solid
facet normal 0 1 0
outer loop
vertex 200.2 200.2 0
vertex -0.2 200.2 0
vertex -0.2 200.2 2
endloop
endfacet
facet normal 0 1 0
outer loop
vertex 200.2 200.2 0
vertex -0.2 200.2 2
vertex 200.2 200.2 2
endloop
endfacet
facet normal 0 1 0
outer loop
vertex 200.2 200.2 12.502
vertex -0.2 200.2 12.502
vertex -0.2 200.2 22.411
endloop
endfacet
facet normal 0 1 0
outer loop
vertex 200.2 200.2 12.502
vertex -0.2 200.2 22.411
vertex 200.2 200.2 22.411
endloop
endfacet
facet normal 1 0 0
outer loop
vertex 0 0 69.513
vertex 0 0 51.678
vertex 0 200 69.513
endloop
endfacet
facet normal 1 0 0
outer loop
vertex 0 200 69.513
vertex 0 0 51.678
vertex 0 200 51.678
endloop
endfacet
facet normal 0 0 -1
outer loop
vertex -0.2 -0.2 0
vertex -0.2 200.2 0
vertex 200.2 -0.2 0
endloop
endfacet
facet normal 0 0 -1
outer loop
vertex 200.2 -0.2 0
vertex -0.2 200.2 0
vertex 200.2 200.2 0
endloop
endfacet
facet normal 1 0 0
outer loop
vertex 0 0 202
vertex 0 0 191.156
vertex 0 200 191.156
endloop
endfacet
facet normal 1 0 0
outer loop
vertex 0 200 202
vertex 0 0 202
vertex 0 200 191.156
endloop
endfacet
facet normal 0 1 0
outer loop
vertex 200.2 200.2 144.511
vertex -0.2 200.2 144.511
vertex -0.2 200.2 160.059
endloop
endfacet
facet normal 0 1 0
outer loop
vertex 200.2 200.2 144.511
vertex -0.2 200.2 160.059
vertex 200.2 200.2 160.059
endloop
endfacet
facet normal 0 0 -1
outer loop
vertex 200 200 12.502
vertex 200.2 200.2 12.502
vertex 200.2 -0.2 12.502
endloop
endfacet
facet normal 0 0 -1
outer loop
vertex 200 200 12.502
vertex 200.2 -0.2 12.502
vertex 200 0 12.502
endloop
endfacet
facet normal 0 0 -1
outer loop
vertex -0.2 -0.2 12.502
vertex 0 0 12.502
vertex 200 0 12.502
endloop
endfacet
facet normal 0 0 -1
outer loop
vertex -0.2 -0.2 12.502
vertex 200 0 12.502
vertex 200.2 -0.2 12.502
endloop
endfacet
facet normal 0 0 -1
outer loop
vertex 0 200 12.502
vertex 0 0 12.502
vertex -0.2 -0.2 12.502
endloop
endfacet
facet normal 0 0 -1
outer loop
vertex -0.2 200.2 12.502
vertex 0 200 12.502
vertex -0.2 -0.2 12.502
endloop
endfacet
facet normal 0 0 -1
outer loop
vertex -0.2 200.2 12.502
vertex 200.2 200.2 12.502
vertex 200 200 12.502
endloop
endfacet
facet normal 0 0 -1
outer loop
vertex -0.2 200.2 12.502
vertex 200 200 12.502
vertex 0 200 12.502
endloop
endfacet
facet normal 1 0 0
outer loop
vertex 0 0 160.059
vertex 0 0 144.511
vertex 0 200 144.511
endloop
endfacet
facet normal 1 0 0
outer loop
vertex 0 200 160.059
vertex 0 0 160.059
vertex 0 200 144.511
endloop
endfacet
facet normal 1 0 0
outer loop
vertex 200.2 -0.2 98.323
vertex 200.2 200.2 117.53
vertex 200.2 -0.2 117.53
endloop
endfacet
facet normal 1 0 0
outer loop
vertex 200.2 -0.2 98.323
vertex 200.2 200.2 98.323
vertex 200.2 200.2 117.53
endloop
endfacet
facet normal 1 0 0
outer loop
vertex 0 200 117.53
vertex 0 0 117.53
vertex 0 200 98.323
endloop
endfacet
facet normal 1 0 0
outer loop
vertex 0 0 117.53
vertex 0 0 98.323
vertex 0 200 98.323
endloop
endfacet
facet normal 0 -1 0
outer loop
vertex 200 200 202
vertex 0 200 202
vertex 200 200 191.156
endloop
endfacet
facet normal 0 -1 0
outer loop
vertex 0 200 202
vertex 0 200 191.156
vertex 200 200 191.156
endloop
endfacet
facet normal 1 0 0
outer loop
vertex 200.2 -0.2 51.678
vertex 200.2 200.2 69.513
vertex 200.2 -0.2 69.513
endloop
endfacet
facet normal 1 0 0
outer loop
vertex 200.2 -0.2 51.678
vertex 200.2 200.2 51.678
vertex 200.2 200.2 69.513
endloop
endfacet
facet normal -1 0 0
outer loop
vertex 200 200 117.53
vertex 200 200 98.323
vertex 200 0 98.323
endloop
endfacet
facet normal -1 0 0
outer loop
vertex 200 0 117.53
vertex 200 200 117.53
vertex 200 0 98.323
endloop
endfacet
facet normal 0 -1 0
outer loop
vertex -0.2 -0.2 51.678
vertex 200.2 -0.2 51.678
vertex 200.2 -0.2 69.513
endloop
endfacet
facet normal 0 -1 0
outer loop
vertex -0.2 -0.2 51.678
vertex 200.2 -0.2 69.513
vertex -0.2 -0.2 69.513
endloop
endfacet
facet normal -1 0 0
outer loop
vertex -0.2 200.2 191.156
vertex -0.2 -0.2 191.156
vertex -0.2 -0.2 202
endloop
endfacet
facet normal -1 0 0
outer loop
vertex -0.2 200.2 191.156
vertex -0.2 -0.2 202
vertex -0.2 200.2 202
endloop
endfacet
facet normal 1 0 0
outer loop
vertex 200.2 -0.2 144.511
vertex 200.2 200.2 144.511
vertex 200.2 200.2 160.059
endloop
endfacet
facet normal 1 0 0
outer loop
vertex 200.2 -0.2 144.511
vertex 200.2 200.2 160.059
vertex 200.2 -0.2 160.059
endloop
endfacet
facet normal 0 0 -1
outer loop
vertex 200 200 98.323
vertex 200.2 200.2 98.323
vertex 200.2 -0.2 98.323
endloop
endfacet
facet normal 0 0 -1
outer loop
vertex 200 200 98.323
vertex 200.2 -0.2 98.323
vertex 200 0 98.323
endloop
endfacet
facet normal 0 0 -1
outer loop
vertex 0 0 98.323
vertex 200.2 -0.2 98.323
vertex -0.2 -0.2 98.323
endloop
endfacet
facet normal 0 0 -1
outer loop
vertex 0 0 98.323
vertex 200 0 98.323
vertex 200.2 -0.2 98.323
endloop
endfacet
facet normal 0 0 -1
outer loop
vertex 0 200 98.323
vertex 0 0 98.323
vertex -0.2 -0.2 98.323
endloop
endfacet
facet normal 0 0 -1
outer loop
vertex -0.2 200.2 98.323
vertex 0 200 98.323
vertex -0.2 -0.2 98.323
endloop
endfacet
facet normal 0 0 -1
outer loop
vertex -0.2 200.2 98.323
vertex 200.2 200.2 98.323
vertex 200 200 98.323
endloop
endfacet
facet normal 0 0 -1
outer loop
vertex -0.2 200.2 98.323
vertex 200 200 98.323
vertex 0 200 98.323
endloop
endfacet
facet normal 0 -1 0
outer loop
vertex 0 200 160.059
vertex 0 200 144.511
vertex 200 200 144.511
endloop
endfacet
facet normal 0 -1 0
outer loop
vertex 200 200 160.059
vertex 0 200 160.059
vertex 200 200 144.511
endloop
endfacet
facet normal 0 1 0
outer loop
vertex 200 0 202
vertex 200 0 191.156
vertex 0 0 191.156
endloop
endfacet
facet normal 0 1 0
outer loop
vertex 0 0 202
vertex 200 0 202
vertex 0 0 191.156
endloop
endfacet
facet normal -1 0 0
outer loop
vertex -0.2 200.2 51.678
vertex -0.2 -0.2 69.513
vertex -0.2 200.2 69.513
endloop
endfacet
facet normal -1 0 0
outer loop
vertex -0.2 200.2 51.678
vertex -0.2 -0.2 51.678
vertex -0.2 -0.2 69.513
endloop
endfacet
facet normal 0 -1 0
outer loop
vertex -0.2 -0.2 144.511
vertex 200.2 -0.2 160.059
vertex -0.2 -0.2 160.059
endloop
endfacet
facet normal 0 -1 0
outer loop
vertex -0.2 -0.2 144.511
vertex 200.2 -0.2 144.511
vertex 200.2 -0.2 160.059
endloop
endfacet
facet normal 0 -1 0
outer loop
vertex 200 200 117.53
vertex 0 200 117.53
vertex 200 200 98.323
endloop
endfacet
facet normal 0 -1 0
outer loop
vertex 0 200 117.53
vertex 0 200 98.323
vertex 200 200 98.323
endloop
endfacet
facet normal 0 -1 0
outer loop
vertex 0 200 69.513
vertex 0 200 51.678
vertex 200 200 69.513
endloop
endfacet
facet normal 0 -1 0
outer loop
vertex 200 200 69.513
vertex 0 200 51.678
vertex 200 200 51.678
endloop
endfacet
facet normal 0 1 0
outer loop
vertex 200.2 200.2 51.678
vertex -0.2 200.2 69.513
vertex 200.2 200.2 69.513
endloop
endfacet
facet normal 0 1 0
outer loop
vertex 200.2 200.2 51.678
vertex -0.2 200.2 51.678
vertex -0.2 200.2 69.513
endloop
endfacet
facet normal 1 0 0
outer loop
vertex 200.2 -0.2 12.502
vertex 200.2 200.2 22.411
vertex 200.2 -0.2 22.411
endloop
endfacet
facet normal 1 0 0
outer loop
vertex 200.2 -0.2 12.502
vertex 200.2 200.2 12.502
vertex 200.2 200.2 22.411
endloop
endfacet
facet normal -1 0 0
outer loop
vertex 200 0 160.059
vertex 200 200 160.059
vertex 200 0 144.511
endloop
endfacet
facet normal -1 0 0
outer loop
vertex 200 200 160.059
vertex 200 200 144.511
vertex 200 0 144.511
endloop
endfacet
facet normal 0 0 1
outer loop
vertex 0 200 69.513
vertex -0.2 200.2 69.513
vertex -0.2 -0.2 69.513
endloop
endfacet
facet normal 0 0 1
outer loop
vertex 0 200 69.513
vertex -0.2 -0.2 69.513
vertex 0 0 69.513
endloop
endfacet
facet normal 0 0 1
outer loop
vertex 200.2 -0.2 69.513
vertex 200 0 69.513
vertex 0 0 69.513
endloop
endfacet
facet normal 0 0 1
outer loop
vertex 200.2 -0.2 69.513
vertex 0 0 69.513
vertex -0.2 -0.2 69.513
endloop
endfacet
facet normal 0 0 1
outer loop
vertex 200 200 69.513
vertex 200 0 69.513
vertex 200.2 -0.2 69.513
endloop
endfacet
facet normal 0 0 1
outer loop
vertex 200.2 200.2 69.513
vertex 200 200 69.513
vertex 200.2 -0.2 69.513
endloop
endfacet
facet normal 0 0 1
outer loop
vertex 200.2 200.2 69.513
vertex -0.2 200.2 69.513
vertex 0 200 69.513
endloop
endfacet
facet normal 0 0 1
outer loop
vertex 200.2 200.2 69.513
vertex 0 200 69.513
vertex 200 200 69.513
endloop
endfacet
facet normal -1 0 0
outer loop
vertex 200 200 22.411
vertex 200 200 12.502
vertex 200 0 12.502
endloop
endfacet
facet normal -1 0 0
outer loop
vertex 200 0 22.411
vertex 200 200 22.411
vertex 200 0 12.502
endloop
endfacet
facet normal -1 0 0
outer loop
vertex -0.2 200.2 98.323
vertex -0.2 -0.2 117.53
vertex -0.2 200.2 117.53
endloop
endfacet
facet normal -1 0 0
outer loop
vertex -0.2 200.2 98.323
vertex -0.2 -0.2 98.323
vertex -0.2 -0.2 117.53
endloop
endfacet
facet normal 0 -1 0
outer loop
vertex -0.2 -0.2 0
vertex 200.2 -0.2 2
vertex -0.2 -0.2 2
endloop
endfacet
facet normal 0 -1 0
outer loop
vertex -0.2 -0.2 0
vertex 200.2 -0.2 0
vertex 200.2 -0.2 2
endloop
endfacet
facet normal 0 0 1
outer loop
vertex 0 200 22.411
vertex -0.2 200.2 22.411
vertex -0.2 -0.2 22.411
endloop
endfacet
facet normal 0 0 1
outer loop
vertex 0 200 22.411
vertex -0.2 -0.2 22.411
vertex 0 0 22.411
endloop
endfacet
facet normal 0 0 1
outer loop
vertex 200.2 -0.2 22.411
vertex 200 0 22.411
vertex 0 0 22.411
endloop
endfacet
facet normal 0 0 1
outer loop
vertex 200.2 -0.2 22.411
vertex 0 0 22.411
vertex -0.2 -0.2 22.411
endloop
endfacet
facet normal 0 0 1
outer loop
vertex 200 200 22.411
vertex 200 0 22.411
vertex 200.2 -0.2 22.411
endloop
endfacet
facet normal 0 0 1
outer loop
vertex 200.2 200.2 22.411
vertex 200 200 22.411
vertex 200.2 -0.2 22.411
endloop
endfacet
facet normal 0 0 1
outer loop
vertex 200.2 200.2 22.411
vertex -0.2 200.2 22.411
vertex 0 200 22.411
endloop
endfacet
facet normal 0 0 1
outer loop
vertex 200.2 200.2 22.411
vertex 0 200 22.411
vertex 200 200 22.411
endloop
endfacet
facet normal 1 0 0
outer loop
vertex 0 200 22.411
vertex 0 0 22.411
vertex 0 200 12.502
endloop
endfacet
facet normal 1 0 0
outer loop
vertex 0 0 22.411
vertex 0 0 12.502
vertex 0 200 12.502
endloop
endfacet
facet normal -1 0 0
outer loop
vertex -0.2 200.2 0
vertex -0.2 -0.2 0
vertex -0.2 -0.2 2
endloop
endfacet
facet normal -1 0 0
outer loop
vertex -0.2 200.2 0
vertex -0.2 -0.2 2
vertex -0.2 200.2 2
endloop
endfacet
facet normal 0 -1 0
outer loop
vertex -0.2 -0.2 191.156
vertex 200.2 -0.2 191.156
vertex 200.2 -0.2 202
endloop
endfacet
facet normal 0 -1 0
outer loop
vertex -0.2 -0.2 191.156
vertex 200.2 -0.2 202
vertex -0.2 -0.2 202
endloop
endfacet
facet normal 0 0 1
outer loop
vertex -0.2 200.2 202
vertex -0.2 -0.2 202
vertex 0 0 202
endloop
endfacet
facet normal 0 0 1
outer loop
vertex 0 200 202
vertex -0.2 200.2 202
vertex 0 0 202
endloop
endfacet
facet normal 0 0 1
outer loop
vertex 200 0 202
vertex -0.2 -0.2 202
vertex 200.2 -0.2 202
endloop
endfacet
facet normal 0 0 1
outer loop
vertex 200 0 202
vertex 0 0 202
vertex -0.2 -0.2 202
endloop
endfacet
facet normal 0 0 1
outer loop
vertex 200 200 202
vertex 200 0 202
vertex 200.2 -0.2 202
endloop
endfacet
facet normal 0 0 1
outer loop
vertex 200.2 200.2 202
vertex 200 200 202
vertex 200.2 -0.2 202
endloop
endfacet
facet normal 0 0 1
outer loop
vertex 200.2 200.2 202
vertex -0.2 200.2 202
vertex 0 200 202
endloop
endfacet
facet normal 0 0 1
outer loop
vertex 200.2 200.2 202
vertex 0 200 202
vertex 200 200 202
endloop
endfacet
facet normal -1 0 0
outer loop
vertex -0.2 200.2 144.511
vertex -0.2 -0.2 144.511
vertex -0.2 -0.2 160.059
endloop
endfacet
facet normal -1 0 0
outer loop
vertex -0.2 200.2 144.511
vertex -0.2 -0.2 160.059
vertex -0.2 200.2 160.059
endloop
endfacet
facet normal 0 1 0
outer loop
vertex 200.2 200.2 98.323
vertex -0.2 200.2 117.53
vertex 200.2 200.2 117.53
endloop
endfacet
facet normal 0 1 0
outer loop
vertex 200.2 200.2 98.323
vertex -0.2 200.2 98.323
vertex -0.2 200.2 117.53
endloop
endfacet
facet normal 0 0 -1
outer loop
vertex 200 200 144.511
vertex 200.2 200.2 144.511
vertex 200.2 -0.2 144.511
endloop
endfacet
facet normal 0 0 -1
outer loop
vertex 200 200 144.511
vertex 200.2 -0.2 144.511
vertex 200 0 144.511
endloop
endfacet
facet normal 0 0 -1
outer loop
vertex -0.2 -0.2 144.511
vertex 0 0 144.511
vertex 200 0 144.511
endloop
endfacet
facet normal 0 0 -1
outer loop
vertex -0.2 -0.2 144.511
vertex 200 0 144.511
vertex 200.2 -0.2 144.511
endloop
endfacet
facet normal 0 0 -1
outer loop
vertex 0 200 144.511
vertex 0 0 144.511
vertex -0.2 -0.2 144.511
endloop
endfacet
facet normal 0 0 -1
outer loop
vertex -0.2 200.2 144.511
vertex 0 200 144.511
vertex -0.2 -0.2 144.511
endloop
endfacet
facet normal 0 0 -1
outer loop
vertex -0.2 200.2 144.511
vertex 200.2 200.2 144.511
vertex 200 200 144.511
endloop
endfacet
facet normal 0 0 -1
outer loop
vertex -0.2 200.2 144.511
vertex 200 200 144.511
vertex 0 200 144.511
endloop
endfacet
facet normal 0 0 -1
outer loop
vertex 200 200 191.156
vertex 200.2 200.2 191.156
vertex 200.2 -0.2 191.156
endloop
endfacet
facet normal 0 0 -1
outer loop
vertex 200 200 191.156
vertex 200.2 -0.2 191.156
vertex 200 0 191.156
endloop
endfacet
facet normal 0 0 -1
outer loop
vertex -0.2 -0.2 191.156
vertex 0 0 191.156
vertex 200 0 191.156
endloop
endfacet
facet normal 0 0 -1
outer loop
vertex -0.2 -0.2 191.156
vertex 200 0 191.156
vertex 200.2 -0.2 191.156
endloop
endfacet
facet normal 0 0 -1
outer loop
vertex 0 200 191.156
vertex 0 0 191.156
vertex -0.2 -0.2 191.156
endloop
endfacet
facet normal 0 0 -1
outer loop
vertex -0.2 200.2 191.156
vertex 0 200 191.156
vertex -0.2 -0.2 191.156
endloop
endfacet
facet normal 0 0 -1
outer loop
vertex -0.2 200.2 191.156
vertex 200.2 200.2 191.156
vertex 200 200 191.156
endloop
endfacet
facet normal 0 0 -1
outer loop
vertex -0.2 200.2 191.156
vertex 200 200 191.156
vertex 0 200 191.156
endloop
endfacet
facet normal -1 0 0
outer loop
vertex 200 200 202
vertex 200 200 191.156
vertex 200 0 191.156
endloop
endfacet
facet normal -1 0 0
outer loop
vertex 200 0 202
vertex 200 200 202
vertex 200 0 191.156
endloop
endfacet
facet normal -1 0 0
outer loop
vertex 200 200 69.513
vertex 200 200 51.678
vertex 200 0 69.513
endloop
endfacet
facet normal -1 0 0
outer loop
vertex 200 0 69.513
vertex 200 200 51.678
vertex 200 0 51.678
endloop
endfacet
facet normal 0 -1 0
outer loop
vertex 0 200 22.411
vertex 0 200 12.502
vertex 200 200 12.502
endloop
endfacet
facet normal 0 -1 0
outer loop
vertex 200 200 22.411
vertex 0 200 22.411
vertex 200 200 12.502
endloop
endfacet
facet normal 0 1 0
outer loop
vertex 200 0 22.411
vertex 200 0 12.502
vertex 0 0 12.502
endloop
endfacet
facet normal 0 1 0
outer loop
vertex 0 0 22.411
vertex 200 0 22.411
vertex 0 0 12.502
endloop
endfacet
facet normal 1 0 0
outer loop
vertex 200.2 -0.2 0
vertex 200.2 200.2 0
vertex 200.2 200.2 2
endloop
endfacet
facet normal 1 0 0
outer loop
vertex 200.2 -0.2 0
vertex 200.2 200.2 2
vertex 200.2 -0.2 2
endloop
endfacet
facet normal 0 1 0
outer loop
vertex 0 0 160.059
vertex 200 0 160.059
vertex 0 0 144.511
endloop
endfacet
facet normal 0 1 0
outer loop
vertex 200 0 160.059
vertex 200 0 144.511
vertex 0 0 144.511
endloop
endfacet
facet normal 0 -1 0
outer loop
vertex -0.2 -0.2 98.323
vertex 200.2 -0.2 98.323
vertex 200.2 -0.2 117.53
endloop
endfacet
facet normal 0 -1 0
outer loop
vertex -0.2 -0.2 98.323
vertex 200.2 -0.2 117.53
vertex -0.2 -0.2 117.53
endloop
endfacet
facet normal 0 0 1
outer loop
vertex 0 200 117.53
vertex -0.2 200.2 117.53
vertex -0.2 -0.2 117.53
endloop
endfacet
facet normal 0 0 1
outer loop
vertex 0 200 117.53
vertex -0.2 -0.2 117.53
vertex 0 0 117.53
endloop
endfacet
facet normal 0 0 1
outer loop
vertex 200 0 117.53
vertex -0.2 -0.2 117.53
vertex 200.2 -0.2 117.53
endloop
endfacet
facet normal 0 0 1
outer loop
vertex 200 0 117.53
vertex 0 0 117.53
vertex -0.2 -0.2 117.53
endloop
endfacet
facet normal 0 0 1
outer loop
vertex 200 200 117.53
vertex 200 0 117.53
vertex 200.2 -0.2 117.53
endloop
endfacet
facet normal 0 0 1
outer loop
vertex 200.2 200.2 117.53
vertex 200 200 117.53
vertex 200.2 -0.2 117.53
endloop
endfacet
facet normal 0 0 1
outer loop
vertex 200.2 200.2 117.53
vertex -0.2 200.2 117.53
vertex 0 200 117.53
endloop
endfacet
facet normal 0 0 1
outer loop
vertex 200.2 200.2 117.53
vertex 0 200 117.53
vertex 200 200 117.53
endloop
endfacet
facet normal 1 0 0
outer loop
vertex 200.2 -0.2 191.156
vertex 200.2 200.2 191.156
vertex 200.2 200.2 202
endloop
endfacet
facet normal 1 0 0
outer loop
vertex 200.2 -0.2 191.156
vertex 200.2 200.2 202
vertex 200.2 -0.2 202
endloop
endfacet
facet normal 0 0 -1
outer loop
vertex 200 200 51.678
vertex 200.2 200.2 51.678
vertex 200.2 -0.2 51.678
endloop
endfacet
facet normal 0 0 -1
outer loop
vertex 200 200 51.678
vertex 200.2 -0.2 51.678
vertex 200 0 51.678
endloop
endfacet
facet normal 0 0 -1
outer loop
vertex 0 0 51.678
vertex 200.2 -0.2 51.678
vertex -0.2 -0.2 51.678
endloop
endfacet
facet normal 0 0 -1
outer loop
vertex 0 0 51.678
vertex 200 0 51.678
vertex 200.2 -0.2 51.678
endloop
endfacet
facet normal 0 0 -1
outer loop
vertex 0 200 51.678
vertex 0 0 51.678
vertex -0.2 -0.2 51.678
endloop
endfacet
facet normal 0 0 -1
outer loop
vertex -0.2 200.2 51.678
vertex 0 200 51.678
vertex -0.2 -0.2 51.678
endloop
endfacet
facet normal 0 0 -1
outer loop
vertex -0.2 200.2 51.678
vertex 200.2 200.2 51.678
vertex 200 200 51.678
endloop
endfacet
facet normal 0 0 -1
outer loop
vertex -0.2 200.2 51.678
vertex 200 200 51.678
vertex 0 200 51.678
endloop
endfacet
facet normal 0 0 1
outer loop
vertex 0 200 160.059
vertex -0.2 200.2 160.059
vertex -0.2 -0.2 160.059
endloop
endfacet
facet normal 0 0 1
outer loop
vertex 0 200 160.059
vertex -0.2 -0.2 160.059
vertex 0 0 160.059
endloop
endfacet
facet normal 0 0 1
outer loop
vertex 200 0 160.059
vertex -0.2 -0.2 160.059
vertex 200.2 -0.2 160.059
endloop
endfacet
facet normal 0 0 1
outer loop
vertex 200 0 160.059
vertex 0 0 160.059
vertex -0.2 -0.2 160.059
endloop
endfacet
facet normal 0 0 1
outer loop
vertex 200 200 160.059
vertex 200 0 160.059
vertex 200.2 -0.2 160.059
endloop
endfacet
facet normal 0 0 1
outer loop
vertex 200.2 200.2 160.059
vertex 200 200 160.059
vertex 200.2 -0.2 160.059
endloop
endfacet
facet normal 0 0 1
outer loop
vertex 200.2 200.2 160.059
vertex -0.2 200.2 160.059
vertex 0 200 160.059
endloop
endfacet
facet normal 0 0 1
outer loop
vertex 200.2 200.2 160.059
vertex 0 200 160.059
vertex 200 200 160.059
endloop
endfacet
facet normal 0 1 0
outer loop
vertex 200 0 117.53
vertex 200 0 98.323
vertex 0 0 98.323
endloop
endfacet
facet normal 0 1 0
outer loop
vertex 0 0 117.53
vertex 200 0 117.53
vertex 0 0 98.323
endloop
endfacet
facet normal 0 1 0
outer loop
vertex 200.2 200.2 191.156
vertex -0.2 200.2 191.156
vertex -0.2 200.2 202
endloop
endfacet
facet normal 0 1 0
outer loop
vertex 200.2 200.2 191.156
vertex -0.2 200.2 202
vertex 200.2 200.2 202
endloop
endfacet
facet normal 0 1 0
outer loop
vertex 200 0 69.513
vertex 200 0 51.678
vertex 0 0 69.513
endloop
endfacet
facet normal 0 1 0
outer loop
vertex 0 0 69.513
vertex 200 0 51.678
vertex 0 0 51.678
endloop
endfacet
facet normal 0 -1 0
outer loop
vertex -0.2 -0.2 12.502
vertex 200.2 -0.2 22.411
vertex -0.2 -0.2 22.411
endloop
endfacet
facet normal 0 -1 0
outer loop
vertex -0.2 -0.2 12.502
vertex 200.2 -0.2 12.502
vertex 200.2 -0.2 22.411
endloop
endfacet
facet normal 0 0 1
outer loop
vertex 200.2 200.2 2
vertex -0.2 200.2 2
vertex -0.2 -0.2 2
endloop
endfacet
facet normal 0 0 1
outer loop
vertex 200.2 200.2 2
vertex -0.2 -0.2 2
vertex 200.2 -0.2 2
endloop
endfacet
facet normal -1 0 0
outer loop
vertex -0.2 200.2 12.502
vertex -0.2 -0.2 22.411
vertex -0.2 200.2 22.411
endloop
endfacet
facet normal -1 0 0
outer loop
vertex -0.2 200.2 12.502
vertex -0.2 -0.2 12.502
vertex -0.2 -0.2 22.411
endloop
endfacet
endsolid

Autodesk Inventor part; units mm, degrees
ref_plane "YZ Plane" through (0, 0, 0) normal (1, 0, 0) x (0, 1, 0)
ref_plane "XZ Plane" through (0, 0, 0) normal (0, 1, 0) x (-1, 0, 0)
ref_plane "XY Plane" through (0, 0, 0) normal (0, 0, 1) x (1, 0, 0)
sketch "Sketch1" plane through (0, 0, 0) normal (0, 0, 1) x (1, 0, 0)
  line L0 (0, 0) -> (200, 0)
  line L1 (200, 0) -> (200, 200)
  line L2 (200, 200) -> (0, 200)
  line L3 (0, 200) -> (0, 0)
  dimension "d0" = 200
  dimension "d1" = 200
extrude "Extrusion1" add sketch "Sketch1" along normal blind 2
sketch "Sketch2" plane through (0, 0, 2) normal (0, 0, 1) x (1, 0, 0)
  line L0 (0, 0) -> (0, 200) projected
  line L1 (200, 0) -> (0, 0) projected
  line L2 (200, 200) -> (200, 0) projected
  line L3 (0, 200) -> (200, 200) projected
  line L4 (200, 0) -> (0, 0)
  line L5 (0, 0) -> (0, 200)
  line L6 (0, 200) -> (200, 200)
  line L7 (200, 200) -> (200, 0)
  line L8 (200.2, -0.2) -> (-0.2, -0.2)
  line L9 (-0.2, -0.2) -> (-0.2, 200.2)
  line L10 (-0.2, 200.2) -> (200.2, 200.2)
  line L11 (200.2, 200.2) -> (200.2, -0.2)
  dimension "d4" = 0.2
  dimension "d5" = 0.2
  dimension "d6" = 0.2
  dimension "d7" = 0.2
extrude "Extrusion2" add sketch "Sketch2" along normal blind 200 and the other way blind 2
sketch "Sketch3" plane through (-0.2, 200.2, 202) normal (0, 1, 0) x (1, 0, 0)
  line L0 (223.7217, 10.8439) -> (-23.2228, 10.8439)
  line L1 (-23.2228, 10.8439) -> (-23.2228, 41.9406)
  line L2 (-23.2228, 41.9406) -> (223.7217, 41.9406)
  line L3 (223.7217, 41.9406) -> (223.7217, 10.8439)
  line L4 (223.7217, 57.4889) -> (-23.2228, 57.4889)
  line L5 (-23.2228, 57.4889) -> (-23.2228, 84.4699)
  line L6 (-23.2228, 84.4699) -> (223.7217, 84.4699)
  line L7 (223.7217, 84.4699) -> (223.7217, 57.4889)
  line L8 (223.7217, 103.6767) -> (-23.2228, 103.6767)
  line L9 (-23.2228, 103.6767) -> (-23.2228, 132.4869)
  line L10 (-23.2228, 132.4869) -> (223.7217, 132.4869)
  line L11 (223.7217, 132.4869) -> (223.7217, 103.6767)
  line L12 (223.7217, 150.3218) -> (-23.2228, 150.3218)
  line L13 (-23.2228, 150.3218) -> (-23.2228, 179.5893)
  line L14 (-23.2228, 179.5893) -> (223.7217, 179.5893)
  line L15 (223.7217, 179.5893) -> (223.7217, 150.3218)
  line L16 (223.7217, 189.4978) -> (-23.2228, 189.4978)
  line L17 (-23.2228, 189.4978) -> (-23.2228, 200)
  line L18 (-23.2228, 200) -> (223.7217, 200)
  line L19 (223.7217, 200) -> (223.7217, 189.4978)
  point P0 (0.2, 202)
extrude "Extrusion3" cut sketch "Sketch3" against normal through all
properties part number "Cage"
